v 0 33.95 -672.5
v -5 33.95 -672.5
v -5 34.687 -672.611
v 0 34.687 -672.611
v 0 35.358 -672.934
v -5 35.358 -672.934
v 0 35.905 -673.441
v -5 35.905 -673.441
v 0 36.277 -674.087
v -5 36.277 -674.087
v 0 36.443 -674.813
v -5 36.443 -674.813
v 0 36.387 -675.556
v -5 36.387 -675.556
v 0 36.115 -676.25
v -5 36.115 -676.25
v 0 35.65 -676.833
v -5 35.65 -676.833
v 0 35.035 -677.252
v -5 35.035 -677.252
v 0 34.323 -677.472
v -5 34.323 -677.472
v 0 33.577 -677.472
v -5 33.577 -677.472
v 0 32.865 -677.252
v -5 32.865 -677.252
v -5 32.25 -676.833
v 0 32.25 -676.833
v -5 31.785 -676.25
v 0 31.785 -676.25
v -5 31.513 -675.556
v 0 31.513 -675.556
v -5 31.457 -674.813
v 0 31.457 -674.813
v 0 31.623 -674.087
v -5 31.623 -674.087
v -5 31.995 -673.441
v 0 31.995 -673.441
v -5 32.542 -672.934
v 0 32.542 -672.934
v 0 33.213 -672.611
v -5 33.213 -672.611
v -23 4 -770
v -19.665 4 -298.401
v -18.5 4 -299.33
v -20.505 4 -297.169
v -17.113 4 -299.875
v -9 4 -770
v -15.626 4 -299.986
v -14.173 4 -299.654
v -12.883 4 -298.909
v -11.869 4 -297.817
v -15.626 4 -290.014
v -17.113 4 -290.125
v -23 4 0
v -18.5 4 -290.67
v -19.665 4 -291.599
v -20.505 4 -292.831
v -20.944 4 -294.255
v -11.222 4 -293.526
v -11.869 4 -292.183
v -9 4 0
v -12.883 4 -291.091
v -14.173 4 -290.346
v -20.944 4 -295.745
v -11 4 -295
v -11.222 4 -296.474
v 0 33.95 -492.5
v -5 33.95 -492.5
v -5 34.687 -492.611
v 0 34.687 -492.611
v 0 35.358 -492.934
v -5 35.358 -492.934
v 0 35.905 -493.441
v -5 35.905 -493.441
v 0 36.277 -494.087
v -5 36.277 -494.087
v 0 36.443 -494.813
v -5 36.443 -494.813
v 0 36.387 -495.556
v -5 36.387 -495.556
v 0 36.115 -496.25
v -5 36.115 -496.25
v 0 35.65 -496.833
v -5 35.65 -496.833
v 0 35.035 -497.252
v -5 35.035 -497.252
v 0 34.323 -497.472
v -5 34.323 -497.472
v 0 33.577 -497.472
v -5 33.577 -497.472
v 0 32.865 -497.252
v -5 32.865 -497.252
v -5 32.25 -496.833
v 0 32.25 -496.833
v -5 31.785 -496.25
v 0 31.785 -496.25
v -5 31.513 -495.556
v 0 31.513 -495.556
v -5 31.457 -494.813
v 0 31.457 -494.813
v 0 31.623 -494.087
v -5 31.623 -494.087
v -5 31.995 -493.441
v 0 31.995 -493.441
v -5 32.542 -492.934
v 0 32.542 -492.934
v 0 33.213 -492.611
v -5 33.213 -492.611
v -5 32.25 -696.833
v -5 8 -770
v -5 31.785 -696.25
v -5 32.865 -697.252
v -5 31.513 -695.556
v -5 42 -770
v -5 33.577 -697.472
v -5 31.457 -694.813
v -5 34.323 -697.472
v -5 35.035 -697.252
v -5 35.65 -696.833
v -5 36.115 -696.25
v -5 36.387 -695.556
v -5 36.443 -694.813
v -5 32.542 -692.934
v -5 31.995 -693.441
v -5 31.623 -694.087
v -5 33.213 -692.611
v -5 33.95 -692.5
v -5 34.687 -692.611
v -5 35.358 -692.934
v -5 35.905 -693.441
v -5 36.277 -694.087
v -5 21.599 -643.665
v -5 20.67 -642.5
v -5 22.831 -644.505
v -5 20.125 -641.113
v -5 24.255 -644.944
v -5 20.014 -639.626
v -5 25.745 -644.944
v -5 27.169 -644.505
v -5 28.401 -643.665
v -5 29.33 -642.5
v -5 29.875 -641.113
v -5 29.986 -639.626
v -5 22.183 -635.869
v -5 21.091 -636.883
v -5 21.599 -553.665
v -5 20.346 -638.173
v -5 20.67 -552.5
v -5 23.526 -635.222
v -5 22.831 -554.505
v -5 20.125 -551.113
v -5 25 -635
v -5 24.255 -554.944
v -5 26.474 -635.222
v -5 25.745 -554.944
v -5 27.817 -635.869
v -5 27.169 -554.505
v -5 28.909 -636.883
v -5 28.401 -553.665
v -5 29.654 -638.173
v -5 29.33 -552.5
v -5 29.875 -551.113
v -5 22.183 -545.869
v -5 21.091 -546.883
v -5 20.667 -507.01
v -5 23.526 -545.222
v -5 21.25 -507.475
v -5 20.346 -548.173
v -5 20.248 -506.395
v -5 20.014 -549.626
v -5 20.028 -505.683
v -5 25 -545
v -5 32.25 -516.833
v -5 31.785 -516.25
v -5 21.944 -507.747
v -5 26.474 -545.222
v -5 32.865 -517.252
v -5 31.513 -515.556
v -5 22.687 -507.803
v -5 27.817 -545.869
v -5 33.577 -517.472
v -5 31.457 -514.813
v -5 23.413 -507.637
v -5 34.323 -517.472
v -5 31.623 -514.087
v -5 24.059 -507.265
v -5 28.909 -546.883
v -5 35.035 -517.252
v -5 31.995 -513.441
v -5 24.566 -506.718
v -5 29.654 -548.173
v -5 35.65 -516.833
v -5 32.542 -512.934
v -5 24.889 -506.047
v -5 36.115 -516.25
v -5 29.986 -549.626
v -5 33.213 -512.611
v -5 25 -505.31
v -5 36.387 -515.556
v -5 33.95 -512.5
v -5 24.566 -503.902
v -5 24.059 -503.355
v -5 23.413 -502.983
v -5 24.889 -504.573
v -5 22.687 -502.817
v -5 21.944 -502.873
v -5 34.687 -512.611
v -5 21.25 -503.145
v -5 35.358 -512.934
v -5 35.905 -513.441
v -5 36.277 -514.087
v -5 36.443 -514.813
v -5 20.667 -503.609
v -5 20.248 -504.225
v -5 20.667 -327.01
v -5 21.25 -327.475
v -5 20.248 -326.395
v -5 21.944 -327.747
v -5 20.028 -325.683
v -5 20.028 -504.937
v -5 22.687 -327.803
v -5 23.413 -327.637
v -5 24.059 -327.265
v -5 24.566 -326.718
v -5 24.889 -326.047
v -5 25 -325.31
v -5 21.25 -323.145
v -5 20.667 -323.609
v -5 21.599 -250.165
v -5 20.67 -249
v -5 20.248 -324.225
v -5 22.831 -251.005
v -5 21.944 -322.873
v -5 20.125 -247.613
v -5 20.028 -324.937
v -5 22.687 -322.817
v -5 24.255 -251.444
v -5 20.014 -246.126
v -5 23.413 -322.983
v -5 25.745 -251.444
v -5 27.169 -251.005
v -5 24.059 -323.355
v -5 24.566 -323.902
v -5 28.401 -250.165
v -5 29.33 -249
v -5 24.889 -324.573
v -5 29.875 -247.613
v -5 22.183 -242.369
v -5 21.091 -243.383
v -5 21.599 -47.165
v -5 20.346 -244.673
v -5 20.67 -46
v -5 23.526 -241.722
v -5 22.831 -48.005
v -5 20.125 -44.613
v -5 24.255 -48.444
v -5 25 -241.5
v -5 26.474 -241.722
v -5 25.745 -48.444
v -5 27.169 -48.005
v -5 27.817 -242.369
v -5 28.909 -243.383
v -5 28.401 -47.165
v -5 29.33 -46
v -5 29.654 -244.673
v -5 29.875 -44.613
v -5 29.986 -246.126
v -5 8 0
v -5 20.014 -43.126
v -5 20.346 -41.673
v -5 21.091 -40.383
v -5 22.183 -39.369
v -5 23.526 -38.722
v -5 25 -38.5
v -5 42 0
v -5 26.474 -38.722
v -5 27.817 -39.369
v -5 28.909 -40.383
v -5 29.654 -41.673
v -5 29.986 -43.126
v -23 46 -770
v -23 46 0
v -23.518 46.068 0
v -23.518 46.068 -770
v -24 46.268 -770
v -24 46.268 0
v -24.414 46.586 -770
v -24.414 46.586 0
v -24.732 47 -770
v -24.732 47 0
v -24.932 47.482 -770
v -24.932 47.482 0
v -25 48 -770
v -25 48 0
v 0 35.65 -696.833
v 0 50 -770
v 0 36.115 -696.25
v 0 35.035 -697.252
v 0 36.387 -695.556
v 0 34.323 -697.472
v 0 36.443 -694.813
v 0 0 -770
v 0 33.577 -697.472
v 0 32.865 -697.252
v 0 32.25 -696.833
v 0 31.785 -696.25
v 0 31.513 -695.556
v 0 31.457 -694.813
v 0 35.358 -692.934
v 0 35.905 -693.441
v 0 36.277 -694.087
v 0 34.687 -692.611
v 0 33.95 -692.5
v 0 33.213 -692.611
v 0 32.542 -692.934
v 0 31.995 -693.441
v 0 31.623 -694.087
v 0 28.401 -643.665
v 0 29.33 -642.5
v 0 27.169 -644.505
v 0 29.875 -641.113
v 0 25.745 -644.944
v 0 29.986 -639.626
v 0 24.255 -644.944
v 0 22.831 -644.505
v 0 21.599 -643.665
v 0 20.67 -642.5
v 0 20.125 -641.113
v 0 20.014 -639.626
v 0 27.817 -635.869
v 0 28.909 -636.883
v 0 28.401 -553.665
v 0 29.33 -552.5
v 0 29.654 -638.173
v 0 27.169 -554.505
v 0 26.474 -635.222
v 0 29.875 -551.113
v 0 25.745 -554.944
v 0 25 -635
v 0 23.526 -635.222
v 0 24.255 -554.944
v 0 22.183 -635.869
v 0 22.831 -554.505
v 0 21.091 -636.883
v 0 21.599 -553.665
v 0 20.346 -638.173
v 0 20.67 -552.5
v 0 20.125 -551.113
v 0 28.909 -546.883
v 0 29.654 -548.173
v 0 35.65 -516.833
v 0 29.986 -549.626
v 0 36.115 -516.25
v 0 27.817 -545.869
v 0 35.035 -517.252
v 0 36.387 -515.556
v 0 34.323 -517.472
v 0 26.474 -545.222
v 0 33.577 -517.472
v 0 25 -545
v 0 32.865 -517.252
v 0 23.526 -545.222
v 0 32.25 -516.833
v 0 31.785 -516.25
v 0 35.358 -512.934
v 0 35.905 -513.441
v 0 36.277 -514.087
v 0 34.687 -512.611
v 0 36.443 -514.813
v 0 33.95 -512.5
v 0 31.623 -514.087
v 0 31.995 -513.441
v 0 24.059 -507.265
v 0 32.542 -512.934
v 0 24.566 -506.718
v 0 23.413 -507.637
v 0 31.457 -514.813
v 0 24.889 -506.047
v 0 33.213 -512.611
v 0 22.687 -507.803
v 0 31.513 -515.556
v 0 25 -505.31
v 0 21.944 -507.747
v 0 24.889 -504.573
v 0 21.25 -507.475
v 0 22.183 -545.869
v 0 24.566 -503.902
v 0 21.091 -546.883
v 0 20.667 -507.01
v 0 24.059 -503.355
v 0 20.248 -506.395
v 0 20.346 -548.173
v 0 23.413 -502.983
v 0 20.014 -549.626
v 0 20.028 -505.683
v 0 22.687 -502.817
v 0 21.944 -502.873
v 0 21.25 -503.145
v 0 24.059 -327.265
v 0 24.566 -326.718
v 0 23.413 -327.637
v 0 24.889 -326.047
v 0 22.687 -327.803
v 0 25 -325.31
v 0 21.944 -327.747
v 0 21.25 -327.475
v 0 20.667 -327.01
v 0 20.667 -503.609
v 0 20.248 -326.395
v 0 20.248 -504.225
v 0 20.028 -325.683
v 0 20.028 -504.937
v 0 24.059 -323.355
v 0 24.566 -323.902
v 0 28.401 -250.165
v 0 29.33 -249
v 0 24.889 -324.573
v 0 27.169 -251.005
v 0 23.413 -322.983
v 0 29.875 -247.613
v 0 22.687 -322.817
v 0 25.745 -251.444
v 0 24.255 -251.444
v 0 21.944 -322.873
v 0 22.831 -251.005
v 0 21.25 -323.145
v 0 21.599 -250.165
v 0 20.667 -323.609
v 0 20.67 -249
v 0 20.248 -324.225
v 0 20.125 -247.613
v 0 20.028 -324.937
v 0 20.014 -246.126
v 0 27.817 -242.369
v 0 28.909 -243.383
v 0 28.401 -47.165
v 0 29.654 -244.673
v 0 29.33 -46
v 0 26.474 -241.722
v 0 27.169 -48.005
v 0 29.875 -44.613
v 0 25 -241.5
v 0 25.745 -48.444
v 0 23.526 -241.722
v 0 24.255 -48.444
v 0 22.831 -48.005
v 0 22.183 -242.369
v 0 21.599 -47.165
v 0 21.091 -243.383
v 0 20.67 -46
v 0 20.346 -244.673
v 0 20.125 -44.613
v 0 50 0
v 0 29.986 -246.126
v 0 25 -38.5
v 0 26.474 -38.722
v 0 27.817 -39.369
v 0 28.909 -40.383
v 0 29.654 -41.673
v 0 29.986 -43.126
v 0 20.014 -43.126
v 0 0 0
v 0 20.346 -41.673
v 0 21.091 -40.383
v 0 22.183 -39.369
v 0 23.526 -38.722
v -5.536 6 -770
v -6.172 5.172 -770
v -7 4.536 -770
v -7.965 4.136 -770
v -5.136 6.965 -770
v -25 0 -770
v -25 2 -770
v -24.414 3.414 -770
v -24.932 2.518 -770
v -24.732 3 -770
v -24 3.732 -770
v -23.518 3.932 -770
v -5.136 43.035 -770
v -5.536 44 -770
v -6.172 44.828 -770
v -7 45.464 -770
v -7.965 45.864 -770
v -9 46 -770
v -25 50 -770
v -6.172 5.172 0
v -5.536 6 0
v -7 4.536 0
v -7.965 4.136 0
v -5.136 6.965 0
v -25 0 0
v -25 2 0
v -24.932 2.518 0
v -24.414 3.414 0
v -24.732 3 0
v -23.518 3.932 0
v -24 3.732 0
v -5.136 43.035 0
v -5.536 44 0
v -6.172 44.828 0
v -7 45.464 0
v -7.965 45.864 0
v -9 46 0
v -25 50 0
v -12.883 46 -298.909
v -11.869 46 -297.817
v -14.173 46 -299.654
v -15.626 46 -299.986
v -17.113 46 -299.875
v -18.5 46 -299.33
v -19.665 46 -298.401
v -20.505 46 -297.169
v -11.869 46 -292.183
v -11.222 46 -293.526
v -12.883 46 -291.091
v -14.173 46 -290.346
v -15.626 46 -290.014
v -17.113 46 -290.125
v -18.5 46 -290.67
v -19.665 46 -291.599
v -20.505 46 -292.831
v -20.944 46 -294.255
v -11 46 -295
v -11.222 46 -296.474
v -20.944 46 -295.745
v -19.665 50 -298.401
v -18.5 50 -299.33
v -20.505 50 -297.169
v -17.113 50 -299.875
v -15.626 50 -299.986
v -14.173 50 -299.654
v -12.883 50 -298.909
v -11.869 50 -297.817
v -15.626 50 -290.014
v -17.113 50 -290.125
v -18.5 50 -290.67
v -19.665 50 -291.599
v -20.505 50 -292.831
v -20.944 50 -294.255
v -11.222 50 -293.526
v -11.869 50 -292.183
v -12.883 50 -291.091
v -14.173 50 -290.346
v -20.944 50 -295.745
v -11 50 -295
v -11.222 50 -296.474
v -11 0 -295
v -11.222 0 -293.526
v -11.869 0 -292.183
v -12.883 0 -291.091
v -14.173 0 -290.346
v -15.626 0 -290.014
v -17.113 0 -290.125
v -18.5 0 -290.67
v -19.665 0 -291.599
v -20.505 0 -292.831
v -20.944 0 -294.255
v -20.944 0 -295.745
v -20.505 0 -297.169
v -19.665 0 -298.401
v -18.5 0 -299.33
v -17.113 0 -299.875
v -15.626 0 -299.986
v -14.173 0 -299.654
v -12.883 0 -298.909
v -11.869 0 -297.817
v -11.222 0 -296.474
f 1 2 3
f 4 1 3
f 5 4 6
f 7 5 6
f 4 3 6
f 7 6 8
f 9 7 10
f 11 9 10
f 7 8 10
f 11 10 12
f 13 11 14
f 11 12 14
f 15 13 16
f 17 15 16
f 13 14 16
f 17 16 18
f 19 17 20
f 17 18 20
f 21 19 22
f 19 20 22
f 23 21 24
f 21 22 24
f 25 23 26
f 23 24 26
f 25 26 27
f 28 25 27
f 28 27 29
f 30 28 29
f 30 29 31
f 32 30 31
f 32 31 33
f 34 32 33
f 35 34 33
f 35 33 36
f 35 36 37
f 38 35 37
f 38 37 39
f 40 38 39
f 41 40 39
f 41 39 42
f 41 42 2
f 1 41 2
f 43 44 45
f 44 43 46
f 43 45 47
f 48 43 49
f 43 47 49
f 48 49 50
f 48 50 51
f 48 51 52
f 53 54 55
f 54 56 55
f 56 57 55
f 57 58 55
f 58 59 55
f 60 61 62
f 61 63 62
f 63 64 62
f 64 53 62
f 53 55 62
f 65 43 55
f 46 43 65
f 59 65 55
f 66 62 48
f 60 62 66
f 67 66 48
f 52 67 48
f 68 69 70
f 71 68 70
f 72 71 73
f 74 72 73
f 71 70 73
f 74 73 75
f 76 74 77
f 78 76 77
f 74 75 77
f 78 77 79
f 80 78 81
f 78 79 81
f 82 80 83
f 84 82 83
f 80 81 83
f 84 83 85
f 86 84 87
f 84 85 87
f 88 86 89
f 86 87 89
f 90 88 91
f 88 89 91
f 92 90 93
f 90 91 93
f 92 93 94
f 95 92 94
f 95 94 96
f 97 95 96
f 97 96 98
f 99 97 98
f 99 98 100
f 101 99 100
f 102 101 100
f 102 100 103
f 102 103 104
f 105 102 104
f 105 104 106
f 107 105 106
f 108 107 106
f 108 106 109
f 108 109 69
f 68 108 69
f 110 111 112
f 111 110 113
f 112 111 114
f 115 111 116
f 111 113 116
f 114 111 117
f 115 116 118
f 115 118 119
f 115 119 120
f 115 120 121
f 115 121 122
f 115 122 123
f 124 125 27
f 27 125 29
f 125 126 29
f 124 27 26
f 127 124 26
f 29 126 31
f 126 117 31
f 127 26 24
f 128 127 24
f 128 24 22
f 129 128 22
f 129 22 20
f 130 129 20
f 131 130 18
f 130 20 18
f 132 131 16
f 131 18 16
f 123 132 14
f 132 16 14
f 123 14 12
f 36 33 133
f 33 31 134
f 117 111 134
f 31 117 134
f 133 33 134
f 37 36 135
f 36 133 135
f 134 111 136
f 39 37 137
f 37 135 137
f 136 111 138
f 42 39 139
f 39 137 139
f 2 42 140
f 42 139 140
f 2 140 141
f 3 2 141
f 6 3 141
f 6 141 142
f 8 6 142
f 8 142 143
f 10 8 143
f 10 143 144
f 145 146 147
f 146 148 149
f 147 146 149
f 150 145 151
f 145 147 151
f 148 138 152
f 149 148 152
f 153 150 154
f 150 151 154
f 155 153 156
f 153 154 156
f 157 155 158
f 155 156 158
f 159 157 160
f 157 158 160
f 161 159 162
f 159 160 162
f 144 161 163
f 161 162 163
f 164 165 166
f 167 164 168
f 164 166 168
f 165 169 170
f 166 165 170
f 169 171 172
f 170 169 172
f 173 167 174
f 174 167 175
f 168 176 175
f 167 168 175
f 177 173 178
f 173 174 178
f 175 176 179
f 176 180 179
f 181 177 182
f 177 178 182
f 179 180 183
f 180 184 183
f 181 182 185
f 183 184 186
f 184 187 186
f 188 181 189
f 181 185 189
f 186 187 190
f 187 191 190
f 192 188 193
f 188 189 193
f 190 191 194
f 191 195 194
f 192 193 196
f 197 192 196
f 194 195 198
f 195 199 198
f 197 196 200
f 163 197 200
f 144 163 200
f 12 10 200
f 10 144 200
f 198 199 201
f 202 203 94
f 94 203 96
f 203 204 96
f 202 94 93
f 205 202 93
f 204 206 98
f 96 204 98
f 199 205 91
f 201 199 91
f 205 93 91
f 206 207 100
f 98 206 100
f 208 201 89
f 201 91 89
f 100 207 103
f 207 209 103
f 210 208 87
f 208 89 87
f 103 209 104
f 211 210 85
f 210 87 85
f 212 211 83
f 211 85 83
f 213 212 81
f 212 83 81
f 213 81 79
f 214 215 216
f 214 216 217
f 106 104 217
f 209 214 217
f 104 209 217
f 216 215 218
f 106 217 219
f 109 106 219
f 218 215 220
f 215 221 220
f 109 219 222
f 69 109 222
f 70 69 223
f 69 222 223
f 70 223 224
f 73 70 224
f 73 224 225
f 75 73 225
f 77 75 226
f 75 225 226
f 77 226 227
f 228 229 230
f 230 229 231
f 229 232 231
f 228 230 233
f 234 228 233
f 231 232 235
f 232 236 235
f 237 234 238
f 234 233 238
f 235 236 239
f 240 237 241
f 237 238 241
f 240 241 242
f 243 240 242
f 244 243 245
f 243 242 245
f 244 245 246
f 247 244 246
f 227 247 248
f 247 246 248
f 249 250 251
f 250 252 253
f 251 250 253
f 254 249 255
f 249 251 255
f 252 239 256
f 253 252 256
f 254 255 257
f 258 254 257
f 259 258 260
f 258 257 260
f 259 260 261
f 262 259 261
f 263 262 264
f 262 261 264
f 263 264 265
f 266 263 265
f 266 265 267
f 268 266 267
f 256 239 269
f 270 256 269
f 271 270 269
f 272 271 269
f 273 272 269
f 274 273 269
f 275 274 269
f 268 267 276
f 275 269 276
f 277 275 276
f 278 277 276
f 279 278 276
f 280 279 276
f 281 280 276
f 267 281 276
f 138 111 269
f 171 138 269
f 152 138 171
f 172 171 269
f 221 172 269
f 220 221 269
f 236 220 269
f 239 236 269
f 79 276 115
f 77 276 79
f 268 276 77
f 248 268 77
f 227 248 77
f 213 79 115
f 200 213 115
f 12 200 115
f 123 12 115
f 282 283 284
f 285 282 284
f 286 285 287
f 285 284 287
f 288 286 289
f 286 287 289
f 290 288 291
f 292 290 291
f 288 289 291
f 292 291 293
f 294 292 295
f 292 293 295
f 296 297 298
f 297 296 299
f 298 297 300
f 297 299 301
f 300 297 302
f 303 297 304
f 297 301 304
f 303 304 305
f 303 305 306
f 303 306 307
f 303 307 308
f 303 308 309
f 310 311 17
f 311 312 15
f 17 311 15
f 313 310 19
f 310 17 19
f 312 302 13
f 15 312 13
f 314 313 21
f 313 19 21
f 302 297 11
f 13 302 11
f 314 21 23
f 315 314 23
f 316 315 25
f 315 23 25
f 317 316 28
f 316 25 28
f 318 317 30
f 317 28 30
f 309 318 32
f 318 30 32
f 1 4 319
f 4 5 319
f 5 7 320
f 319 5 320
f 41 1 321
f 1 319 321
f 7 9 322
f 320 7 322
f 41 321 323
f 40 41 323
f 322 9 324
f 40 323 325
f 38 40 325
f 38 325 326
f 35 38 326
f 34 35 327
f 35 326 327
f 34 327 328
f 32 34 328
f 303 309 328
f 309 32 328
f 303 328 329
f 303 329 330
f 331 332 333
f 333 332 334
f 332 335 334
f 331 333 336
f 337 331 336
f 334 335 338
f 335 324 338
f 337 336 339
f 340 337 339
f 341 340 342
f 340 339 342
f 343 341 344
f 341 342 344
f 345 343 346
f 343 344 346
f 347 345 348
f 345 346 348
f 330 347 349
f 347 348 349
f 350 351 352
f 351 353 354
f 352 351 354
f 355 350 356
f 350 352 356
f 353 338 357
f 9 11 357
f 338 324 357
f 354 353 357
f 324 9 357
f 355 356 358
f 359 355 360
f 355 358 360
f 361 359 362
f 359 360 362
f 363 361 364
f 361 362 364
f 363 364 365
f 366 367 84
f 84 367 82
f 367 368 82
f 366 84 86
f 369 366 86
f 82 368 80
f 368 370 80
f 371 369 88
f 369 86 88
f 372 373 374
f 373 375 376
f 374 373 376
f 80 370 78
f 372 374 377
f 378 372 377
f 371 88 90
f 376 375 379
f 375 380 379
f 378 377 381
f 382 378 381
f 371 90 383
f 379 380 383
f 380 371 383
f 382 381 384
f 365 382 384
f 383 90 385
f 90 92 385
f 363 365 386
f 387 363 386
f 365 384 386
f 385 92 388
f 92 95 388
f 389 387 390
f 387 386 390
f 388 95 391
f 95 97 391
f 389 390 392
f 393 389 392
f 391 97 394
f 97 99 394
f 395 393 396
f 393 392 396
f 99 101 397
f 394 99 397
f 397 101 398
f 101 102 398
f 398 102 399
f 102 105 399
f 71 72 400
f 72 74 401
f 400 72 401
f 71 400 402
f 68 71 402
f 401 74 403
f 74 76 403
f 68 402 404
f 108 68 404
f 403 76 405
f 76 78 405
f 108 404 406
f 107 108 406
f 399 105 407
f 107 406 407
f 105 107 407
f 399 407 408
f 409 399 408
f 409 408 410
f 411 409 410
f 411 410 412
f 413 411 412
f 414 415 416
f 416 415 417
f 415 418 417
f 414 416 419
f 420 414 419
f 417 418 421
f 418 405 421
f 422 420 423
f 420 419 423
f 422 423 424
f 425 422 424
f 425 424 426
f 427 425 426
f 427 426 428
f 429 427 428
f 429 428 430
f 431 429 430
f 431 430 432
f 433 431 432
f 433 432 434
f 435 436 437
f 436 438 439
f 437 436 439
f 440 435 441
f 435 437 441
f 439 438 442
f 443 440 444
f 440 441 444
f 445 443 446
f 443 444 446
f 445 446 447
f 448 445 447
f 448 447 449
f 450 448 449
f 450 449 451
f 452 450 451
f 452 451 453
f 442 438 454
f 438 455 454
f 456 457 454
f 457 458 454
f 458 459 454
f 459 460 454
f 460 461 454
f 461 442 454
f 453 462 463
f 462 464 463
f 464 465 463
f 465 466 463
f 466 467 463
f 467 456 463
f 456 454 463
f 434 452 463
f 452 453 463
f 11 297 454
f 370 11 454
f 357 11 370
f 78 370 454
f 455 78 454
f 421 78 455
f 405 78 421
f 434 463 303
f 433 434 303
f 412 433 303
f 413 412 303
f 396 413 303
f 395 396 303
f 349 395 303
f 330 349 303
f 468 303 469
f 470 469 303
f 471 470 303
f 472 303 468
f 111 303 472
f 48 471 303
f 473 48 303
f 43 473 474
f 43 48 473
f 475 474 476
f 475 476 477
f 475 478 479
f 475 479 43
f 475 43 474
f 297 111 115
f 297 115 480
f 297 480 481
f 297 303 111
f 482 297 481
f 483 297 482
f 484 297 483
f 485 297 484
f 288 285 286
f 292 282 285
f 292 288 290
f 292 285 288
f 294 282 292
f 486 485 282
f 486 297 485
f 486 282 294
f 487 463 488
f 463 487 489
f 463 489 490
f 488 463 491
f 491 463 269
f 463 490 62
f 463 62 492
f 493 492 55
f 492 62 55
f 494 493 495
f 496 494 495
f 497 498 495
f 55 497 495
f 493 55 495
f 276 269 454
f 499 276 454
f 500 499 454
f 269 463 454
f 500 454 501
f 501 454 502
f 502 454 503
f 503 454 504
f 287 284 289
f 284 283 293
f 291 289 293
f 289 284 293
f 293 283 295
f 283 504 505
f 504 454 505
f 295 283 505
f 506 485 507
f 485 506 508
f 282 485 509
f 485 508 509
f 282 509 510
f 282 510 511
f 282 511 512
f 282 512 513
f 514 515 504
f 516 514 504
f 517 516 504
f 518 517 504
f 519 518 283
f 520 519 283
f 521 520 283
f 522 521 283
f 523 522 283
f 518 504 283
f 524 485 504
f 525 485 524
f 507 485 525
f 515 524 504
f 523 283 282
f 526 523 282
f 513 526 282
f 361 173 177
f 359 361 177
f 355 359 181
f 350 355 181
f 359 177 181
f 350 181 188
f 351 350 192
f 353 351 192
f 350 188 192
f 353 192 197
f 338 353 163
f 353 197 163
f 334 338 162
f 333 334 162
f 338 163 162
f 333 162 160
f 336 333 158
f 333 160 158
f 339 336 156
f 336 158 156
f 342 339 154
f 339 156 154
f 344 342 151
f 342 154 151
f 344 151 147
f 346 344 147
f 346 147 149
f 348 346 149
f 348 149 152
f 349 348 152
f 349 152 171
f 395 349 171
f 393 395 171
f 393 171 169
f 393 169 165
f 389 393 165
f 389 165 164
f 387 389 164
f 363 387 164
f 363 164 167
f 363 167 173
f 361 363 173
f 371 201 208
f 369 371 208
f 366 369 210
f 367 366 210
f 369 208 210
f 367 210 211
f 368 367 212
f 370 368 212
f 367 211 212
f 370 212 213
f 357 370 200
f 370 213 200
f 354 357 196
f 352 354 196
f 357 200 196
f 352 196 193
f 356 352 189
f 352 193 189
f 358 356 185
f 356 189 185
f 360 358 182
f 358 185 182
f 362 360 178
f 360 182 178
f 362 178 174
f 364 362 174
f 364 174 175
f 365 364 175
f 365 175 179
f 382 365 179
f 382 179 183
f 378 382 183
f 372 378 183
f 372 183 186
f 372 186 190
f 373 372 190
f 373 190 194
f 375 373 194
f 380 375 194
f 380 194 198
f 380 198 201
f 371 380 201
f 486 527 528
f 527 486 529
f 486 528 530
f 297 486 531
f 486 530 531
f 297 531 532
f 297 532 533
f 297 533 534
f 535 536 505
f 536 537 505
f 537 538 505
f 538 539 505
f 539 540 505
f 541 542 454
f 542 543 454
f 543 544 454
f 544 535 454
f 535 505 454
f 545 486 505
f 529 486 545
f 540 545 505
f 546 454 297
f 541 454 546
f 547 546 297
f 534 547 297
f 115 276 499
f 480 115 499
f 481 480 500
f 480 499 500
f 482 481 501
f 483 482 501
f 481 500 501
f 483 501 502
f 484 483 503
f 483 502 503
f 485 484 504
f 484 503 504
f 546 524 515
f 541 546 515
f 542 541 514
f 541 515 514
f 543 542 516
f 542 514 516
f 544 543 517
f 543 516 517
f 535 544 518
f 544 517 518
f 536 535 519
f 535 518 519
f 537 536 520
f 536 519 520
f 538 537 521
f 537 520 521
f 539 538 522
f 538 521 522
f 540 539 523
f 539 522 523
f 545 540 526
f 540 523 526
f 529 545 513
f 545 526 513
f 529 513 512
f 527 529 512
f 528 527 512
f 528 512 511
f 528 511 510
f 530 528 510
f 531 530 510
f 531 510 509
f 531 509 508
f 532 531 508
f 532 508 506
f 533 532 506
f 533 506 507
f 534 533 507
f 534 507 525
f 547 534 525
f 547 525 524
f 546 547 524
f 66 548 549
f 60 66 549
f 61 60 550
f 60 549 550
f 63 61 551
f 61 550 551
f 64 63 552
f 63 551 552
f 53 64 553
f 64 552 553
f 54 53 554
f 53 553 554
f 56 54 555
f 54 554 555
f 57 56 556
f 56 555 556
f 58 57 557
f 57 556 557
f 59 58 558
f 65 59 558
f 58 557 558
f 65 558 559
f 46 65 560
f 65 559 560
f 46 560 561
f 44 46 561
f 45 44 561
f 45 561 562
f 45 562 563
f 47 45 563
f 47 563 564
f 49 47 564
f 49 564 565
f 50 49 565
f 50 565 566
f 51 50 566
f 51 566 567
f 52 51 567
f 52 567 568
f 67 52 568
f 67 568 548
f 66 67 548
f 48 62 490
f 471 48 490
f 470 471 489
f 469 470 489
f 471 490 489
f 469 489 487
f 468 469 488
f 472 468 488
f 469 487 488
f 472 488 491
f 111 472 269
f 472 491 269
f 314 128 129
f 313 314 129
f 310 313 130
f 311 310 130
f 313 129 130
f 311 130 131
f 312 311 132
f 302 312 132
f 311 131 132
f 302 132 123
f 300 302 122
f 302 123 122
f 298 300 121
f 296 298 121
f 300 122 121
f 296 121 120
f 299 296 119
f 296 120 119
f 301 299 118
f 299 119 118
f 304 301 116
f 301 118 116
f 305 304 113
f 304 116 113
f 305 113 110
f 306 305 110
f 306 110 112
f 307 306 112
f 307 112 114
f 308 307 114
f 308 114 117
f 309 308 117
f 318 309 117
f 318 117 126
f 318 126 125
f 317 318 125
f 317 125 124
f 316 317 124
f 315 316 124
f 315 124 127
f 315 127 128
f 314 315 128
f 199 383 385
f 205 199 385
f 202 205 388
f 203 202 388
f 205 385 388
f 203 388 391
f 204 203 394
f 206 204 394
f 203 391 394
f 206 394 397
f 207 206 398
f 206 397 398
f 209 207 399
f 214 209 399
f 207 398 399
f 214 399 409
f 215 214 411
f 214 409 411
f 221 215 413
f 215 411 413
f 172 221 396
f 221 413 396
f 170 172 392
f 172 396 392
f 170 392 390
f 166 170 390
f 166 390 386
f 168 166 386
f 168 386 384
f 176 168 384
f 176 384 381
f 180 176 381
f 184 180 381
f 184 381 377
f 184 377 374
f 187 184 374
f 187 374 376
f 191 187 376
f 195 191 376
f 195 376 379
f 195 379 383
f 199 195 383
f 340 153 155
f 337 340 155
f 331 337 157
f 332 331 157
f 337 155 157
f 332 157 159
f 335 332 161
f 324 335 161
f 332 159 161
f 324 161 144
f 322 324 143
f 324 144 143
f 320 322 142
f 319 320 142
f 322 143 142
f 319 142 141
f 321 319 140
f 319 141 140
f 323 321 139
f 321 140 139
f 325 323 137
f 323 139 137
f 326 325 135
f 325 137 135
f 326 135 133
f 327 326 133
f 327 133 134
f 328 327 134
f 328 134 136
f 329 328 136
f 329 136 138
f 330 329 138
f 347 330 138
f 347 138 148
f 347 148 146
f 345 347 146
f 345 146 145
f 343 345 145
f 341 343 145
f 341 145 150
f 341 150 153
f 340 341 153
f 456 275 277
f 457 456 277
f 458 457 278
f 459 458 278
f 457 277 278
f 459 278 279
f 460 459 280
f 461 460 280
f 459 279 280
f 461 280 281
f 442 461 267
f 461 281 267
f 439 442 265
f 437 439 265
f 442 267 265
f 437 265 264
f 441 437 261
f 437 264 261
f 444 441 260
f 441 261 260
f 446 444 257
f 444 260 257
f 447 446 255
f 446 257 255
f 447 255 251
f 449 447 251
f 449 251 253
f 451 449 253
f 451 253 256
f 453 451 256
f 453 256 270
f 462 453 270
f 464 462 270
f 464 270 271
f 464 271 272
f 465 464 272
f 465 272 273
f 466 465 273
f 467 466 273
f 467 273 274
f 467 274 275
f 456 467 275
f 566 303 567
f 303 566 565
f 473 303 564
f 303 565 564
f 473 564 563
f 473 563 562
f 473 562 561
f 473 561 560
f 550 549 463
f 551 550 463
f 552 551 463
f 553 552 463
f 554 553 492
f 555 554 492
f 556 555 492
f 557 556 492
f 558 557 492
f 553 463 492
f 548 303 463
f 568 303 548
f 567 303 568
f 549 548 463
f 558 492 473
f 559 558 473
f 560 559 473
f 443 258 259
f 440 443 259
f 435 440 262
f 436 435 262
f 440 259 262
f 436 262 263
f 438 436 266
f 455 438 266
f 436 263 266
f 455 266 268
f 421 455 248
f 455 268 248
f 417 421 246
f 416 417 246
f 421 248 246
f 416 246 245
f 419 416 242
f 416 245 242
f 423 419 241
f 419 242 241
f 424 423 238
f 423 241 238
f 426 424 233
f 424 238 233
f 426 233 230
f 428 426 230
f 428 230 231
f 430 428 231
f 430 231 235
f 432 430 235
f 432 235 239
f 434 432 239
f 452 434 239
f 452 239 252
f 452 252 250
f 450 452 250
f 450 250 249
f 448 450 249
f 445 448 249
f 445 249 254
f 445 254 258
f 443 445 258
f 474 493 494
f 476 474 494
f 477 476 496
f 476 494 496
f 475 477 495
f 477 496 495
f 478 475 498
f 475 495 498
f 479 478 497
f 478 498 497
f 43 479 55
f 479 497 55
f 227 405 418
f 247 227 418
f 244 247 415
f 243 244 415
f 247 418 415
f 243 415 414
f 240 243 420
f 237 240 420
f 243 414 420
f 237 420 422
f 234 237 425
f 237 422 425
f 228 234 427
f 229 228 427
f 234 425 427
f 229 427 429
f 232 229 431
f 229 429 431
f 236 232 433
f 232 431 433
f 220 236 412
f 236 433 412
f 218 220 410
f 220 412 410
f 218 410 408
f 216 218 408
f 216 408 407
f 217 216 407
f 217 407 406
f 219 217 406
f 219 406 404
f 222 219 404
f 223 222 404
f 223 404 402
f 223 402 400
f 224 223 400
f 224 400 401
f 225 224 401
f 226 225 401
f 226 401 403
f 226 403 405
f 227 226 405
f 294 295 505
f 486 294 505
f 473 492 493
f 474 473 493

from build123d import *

# Parameters (mm, degrees)
STRUCTURAL_MEMBER1_DEPTH       = 770
F_10_0_10_DIAMETER_HOLE1_D     = 10
F_10_0_10_DIAMETER_HOLE1_DEPTH = 11
F_10_0_10_DIAMETER_HOLE1_TIP   = 3.004303095
SKETCH28_R                     = 5
CUT_EXTRUDE1_DEPTH             = 773.026553947
F_10_0_10_DIAMETER_HOLE2_D     = 10
F_10_0_10_DIAMETER_HOLE2_DEPTH = 11
F_10_0_10_DIAMETER_HOLE2_TIP   = 3.004303095
F_5_0_5_DIAMETER_HOLE1_D       = 5
F_5_0_5_DIAMETER_HOLE1_DEPTH   = 11
F_5_0_5_DIAMETER_HOLE1_TIP     = 1.502151548
SKETCH33_R                     = 2.5
CUT_EXTRUDE2_DEPTH             = 10


with BuildPart() as part:
    # Sketch11 → Structural Member1 (new body)
    with BuildSketch(Plane(origin=(0, 0, 0), x_dir=(-1, 0, 0), z_dir=(0, 0, -1))):
        with BuildLine():
            Line((25, 50), (0, 50))
            Line((0, 50), (0, 0))
            Line((0, 0), (25, 0))
            Line((25, 0), (25, 2))
            ThreePointArc((25, 2), (24.414213562, 3.414213562), (23, 4))
            Line((23, 4), (9, 4))
            ThreePointArc((9, 4), (6.171572875, 5.171572875), (5, 8))
            Line((5, 8), (5, 42))
            ThreePointArc((5, 42), (6.171572875, 44.828427125), (9, 46))
            Line((9, 46), (23, 46))
            ThreePointArc((23, 46), (24.414213562, 46.585786438), (25, 48))
            Line((25, 48), (25, 50))
        make_face()
    extrude(amount=STRUCTURAL_MEMBER1_DEPTH)

    # Ø10.0 (10) Diameter Hole1
    with Locations(Plane(origin=(0, 0, 0), x_dir=(0, 0, -1), z_dir=(1, 0, 0))):
        with Locations((550, 25), (640, 25)):
            Hole(F_10_0_10_DIAMETER_HOLE1_D / 2, depth=F_10_0_10_DIAMETER_HOLE1_DEPTH)
            with Locations((0, 0, -(F_10_0_10_DIAMETER_HOLE1_DEPTH + F_10_0_10_DIAMETER_HOLE1_TIP / 2))):  # 118° drill point
                Cone(0, F_10_0_10_DIAMETER_HOLE1_D / 2, F_10_0_10_DIAMETER_HOLE1_TIP, mode=Mode.SUBTRACT)

    # Sketch28 → Cut-Extrude1 (cut, through all)
    with BuildSketch(Plane.XZ):
        with Locations((-16, -295)):
            Circle(SKETCH28_R)
    extrude(amount=-CUT_EXTRUDE1_DEPTH, mode=Mode.SUBTRACT)

    # Ø10.0 (10) Diameter Hole2
    with Locations(Plane(origin=(0, 0, 0), x_dir=(0, 0, -1), z_dir=(1, 0, 0))):
        with Locations((43.5, 25), (246.5, 25)):
            Hole(F_10_0_10_DIAMETER_HOLE2_D / 2, depth=F_10_0_10_DIAMETER_HOLE2_DEPTH)
            with Locations((0, 0, -(F_10_0_10_DIAMETER_HOLE2_DEPTH + F_10_0_10_DIAMETER_HOLE2_TIP / 2))):  # 118° drill point
                Cone(0, F_10_0_10_DIAMETER_HOLE2_D / 2, F_10_0_10_DIAMETER_HOLE2_TIP, mode=Mode.SUBTRACT)

    # Ø5.0 (5) Diameter Hole1
    with Locations(Plane(origin=(0, 0, 0), x_dir=(0, 0, -1), z_dir=(1, 0, 0))):
        with Locations((515, 33.95), (675, 33.95), (495, 33.95), (695, 33.95)):
            Hole(F_5_0_5_DIAMETER_HOLE1_D / 2, depth=F_5_0_5_DIAMETER_HOLE1_DEPTH)
            with Locations((0, 0, -(F_5_0_5_DIAMETER_HOLE1_DEPTH + F_5_0_5_DIAMETER_HOLE1_TIP / 2))):  # 118° drill point
                Cone(0, F_5_0_5_DIAMETER_HOLE1_D / 2, F_5_0_5_DIAMETER_HOLE1_TIP, mode=Mode.SUBTRACT)

    # Sketch33 → Cut-Extrude2 (cut)
    with BuildSketch(Plane(origin=(0, 0, 0), x_dir=(0, 0, -1), z_dir=(1, 0, 0))):
        with Locations(Location((505.309927761, 22.5, 0), (0, 0, 90))):
            Circle(SKETCH33_R)
        with Locations(Location((325.309927761, 22.5, 0), (0, 0, 90))):
            Circle(SKETCH33_R)
    extrude(amount=-CUT_EXTRUDE2_DEPTH, mode=Mode.SUBTRACT)


solid = part.part
